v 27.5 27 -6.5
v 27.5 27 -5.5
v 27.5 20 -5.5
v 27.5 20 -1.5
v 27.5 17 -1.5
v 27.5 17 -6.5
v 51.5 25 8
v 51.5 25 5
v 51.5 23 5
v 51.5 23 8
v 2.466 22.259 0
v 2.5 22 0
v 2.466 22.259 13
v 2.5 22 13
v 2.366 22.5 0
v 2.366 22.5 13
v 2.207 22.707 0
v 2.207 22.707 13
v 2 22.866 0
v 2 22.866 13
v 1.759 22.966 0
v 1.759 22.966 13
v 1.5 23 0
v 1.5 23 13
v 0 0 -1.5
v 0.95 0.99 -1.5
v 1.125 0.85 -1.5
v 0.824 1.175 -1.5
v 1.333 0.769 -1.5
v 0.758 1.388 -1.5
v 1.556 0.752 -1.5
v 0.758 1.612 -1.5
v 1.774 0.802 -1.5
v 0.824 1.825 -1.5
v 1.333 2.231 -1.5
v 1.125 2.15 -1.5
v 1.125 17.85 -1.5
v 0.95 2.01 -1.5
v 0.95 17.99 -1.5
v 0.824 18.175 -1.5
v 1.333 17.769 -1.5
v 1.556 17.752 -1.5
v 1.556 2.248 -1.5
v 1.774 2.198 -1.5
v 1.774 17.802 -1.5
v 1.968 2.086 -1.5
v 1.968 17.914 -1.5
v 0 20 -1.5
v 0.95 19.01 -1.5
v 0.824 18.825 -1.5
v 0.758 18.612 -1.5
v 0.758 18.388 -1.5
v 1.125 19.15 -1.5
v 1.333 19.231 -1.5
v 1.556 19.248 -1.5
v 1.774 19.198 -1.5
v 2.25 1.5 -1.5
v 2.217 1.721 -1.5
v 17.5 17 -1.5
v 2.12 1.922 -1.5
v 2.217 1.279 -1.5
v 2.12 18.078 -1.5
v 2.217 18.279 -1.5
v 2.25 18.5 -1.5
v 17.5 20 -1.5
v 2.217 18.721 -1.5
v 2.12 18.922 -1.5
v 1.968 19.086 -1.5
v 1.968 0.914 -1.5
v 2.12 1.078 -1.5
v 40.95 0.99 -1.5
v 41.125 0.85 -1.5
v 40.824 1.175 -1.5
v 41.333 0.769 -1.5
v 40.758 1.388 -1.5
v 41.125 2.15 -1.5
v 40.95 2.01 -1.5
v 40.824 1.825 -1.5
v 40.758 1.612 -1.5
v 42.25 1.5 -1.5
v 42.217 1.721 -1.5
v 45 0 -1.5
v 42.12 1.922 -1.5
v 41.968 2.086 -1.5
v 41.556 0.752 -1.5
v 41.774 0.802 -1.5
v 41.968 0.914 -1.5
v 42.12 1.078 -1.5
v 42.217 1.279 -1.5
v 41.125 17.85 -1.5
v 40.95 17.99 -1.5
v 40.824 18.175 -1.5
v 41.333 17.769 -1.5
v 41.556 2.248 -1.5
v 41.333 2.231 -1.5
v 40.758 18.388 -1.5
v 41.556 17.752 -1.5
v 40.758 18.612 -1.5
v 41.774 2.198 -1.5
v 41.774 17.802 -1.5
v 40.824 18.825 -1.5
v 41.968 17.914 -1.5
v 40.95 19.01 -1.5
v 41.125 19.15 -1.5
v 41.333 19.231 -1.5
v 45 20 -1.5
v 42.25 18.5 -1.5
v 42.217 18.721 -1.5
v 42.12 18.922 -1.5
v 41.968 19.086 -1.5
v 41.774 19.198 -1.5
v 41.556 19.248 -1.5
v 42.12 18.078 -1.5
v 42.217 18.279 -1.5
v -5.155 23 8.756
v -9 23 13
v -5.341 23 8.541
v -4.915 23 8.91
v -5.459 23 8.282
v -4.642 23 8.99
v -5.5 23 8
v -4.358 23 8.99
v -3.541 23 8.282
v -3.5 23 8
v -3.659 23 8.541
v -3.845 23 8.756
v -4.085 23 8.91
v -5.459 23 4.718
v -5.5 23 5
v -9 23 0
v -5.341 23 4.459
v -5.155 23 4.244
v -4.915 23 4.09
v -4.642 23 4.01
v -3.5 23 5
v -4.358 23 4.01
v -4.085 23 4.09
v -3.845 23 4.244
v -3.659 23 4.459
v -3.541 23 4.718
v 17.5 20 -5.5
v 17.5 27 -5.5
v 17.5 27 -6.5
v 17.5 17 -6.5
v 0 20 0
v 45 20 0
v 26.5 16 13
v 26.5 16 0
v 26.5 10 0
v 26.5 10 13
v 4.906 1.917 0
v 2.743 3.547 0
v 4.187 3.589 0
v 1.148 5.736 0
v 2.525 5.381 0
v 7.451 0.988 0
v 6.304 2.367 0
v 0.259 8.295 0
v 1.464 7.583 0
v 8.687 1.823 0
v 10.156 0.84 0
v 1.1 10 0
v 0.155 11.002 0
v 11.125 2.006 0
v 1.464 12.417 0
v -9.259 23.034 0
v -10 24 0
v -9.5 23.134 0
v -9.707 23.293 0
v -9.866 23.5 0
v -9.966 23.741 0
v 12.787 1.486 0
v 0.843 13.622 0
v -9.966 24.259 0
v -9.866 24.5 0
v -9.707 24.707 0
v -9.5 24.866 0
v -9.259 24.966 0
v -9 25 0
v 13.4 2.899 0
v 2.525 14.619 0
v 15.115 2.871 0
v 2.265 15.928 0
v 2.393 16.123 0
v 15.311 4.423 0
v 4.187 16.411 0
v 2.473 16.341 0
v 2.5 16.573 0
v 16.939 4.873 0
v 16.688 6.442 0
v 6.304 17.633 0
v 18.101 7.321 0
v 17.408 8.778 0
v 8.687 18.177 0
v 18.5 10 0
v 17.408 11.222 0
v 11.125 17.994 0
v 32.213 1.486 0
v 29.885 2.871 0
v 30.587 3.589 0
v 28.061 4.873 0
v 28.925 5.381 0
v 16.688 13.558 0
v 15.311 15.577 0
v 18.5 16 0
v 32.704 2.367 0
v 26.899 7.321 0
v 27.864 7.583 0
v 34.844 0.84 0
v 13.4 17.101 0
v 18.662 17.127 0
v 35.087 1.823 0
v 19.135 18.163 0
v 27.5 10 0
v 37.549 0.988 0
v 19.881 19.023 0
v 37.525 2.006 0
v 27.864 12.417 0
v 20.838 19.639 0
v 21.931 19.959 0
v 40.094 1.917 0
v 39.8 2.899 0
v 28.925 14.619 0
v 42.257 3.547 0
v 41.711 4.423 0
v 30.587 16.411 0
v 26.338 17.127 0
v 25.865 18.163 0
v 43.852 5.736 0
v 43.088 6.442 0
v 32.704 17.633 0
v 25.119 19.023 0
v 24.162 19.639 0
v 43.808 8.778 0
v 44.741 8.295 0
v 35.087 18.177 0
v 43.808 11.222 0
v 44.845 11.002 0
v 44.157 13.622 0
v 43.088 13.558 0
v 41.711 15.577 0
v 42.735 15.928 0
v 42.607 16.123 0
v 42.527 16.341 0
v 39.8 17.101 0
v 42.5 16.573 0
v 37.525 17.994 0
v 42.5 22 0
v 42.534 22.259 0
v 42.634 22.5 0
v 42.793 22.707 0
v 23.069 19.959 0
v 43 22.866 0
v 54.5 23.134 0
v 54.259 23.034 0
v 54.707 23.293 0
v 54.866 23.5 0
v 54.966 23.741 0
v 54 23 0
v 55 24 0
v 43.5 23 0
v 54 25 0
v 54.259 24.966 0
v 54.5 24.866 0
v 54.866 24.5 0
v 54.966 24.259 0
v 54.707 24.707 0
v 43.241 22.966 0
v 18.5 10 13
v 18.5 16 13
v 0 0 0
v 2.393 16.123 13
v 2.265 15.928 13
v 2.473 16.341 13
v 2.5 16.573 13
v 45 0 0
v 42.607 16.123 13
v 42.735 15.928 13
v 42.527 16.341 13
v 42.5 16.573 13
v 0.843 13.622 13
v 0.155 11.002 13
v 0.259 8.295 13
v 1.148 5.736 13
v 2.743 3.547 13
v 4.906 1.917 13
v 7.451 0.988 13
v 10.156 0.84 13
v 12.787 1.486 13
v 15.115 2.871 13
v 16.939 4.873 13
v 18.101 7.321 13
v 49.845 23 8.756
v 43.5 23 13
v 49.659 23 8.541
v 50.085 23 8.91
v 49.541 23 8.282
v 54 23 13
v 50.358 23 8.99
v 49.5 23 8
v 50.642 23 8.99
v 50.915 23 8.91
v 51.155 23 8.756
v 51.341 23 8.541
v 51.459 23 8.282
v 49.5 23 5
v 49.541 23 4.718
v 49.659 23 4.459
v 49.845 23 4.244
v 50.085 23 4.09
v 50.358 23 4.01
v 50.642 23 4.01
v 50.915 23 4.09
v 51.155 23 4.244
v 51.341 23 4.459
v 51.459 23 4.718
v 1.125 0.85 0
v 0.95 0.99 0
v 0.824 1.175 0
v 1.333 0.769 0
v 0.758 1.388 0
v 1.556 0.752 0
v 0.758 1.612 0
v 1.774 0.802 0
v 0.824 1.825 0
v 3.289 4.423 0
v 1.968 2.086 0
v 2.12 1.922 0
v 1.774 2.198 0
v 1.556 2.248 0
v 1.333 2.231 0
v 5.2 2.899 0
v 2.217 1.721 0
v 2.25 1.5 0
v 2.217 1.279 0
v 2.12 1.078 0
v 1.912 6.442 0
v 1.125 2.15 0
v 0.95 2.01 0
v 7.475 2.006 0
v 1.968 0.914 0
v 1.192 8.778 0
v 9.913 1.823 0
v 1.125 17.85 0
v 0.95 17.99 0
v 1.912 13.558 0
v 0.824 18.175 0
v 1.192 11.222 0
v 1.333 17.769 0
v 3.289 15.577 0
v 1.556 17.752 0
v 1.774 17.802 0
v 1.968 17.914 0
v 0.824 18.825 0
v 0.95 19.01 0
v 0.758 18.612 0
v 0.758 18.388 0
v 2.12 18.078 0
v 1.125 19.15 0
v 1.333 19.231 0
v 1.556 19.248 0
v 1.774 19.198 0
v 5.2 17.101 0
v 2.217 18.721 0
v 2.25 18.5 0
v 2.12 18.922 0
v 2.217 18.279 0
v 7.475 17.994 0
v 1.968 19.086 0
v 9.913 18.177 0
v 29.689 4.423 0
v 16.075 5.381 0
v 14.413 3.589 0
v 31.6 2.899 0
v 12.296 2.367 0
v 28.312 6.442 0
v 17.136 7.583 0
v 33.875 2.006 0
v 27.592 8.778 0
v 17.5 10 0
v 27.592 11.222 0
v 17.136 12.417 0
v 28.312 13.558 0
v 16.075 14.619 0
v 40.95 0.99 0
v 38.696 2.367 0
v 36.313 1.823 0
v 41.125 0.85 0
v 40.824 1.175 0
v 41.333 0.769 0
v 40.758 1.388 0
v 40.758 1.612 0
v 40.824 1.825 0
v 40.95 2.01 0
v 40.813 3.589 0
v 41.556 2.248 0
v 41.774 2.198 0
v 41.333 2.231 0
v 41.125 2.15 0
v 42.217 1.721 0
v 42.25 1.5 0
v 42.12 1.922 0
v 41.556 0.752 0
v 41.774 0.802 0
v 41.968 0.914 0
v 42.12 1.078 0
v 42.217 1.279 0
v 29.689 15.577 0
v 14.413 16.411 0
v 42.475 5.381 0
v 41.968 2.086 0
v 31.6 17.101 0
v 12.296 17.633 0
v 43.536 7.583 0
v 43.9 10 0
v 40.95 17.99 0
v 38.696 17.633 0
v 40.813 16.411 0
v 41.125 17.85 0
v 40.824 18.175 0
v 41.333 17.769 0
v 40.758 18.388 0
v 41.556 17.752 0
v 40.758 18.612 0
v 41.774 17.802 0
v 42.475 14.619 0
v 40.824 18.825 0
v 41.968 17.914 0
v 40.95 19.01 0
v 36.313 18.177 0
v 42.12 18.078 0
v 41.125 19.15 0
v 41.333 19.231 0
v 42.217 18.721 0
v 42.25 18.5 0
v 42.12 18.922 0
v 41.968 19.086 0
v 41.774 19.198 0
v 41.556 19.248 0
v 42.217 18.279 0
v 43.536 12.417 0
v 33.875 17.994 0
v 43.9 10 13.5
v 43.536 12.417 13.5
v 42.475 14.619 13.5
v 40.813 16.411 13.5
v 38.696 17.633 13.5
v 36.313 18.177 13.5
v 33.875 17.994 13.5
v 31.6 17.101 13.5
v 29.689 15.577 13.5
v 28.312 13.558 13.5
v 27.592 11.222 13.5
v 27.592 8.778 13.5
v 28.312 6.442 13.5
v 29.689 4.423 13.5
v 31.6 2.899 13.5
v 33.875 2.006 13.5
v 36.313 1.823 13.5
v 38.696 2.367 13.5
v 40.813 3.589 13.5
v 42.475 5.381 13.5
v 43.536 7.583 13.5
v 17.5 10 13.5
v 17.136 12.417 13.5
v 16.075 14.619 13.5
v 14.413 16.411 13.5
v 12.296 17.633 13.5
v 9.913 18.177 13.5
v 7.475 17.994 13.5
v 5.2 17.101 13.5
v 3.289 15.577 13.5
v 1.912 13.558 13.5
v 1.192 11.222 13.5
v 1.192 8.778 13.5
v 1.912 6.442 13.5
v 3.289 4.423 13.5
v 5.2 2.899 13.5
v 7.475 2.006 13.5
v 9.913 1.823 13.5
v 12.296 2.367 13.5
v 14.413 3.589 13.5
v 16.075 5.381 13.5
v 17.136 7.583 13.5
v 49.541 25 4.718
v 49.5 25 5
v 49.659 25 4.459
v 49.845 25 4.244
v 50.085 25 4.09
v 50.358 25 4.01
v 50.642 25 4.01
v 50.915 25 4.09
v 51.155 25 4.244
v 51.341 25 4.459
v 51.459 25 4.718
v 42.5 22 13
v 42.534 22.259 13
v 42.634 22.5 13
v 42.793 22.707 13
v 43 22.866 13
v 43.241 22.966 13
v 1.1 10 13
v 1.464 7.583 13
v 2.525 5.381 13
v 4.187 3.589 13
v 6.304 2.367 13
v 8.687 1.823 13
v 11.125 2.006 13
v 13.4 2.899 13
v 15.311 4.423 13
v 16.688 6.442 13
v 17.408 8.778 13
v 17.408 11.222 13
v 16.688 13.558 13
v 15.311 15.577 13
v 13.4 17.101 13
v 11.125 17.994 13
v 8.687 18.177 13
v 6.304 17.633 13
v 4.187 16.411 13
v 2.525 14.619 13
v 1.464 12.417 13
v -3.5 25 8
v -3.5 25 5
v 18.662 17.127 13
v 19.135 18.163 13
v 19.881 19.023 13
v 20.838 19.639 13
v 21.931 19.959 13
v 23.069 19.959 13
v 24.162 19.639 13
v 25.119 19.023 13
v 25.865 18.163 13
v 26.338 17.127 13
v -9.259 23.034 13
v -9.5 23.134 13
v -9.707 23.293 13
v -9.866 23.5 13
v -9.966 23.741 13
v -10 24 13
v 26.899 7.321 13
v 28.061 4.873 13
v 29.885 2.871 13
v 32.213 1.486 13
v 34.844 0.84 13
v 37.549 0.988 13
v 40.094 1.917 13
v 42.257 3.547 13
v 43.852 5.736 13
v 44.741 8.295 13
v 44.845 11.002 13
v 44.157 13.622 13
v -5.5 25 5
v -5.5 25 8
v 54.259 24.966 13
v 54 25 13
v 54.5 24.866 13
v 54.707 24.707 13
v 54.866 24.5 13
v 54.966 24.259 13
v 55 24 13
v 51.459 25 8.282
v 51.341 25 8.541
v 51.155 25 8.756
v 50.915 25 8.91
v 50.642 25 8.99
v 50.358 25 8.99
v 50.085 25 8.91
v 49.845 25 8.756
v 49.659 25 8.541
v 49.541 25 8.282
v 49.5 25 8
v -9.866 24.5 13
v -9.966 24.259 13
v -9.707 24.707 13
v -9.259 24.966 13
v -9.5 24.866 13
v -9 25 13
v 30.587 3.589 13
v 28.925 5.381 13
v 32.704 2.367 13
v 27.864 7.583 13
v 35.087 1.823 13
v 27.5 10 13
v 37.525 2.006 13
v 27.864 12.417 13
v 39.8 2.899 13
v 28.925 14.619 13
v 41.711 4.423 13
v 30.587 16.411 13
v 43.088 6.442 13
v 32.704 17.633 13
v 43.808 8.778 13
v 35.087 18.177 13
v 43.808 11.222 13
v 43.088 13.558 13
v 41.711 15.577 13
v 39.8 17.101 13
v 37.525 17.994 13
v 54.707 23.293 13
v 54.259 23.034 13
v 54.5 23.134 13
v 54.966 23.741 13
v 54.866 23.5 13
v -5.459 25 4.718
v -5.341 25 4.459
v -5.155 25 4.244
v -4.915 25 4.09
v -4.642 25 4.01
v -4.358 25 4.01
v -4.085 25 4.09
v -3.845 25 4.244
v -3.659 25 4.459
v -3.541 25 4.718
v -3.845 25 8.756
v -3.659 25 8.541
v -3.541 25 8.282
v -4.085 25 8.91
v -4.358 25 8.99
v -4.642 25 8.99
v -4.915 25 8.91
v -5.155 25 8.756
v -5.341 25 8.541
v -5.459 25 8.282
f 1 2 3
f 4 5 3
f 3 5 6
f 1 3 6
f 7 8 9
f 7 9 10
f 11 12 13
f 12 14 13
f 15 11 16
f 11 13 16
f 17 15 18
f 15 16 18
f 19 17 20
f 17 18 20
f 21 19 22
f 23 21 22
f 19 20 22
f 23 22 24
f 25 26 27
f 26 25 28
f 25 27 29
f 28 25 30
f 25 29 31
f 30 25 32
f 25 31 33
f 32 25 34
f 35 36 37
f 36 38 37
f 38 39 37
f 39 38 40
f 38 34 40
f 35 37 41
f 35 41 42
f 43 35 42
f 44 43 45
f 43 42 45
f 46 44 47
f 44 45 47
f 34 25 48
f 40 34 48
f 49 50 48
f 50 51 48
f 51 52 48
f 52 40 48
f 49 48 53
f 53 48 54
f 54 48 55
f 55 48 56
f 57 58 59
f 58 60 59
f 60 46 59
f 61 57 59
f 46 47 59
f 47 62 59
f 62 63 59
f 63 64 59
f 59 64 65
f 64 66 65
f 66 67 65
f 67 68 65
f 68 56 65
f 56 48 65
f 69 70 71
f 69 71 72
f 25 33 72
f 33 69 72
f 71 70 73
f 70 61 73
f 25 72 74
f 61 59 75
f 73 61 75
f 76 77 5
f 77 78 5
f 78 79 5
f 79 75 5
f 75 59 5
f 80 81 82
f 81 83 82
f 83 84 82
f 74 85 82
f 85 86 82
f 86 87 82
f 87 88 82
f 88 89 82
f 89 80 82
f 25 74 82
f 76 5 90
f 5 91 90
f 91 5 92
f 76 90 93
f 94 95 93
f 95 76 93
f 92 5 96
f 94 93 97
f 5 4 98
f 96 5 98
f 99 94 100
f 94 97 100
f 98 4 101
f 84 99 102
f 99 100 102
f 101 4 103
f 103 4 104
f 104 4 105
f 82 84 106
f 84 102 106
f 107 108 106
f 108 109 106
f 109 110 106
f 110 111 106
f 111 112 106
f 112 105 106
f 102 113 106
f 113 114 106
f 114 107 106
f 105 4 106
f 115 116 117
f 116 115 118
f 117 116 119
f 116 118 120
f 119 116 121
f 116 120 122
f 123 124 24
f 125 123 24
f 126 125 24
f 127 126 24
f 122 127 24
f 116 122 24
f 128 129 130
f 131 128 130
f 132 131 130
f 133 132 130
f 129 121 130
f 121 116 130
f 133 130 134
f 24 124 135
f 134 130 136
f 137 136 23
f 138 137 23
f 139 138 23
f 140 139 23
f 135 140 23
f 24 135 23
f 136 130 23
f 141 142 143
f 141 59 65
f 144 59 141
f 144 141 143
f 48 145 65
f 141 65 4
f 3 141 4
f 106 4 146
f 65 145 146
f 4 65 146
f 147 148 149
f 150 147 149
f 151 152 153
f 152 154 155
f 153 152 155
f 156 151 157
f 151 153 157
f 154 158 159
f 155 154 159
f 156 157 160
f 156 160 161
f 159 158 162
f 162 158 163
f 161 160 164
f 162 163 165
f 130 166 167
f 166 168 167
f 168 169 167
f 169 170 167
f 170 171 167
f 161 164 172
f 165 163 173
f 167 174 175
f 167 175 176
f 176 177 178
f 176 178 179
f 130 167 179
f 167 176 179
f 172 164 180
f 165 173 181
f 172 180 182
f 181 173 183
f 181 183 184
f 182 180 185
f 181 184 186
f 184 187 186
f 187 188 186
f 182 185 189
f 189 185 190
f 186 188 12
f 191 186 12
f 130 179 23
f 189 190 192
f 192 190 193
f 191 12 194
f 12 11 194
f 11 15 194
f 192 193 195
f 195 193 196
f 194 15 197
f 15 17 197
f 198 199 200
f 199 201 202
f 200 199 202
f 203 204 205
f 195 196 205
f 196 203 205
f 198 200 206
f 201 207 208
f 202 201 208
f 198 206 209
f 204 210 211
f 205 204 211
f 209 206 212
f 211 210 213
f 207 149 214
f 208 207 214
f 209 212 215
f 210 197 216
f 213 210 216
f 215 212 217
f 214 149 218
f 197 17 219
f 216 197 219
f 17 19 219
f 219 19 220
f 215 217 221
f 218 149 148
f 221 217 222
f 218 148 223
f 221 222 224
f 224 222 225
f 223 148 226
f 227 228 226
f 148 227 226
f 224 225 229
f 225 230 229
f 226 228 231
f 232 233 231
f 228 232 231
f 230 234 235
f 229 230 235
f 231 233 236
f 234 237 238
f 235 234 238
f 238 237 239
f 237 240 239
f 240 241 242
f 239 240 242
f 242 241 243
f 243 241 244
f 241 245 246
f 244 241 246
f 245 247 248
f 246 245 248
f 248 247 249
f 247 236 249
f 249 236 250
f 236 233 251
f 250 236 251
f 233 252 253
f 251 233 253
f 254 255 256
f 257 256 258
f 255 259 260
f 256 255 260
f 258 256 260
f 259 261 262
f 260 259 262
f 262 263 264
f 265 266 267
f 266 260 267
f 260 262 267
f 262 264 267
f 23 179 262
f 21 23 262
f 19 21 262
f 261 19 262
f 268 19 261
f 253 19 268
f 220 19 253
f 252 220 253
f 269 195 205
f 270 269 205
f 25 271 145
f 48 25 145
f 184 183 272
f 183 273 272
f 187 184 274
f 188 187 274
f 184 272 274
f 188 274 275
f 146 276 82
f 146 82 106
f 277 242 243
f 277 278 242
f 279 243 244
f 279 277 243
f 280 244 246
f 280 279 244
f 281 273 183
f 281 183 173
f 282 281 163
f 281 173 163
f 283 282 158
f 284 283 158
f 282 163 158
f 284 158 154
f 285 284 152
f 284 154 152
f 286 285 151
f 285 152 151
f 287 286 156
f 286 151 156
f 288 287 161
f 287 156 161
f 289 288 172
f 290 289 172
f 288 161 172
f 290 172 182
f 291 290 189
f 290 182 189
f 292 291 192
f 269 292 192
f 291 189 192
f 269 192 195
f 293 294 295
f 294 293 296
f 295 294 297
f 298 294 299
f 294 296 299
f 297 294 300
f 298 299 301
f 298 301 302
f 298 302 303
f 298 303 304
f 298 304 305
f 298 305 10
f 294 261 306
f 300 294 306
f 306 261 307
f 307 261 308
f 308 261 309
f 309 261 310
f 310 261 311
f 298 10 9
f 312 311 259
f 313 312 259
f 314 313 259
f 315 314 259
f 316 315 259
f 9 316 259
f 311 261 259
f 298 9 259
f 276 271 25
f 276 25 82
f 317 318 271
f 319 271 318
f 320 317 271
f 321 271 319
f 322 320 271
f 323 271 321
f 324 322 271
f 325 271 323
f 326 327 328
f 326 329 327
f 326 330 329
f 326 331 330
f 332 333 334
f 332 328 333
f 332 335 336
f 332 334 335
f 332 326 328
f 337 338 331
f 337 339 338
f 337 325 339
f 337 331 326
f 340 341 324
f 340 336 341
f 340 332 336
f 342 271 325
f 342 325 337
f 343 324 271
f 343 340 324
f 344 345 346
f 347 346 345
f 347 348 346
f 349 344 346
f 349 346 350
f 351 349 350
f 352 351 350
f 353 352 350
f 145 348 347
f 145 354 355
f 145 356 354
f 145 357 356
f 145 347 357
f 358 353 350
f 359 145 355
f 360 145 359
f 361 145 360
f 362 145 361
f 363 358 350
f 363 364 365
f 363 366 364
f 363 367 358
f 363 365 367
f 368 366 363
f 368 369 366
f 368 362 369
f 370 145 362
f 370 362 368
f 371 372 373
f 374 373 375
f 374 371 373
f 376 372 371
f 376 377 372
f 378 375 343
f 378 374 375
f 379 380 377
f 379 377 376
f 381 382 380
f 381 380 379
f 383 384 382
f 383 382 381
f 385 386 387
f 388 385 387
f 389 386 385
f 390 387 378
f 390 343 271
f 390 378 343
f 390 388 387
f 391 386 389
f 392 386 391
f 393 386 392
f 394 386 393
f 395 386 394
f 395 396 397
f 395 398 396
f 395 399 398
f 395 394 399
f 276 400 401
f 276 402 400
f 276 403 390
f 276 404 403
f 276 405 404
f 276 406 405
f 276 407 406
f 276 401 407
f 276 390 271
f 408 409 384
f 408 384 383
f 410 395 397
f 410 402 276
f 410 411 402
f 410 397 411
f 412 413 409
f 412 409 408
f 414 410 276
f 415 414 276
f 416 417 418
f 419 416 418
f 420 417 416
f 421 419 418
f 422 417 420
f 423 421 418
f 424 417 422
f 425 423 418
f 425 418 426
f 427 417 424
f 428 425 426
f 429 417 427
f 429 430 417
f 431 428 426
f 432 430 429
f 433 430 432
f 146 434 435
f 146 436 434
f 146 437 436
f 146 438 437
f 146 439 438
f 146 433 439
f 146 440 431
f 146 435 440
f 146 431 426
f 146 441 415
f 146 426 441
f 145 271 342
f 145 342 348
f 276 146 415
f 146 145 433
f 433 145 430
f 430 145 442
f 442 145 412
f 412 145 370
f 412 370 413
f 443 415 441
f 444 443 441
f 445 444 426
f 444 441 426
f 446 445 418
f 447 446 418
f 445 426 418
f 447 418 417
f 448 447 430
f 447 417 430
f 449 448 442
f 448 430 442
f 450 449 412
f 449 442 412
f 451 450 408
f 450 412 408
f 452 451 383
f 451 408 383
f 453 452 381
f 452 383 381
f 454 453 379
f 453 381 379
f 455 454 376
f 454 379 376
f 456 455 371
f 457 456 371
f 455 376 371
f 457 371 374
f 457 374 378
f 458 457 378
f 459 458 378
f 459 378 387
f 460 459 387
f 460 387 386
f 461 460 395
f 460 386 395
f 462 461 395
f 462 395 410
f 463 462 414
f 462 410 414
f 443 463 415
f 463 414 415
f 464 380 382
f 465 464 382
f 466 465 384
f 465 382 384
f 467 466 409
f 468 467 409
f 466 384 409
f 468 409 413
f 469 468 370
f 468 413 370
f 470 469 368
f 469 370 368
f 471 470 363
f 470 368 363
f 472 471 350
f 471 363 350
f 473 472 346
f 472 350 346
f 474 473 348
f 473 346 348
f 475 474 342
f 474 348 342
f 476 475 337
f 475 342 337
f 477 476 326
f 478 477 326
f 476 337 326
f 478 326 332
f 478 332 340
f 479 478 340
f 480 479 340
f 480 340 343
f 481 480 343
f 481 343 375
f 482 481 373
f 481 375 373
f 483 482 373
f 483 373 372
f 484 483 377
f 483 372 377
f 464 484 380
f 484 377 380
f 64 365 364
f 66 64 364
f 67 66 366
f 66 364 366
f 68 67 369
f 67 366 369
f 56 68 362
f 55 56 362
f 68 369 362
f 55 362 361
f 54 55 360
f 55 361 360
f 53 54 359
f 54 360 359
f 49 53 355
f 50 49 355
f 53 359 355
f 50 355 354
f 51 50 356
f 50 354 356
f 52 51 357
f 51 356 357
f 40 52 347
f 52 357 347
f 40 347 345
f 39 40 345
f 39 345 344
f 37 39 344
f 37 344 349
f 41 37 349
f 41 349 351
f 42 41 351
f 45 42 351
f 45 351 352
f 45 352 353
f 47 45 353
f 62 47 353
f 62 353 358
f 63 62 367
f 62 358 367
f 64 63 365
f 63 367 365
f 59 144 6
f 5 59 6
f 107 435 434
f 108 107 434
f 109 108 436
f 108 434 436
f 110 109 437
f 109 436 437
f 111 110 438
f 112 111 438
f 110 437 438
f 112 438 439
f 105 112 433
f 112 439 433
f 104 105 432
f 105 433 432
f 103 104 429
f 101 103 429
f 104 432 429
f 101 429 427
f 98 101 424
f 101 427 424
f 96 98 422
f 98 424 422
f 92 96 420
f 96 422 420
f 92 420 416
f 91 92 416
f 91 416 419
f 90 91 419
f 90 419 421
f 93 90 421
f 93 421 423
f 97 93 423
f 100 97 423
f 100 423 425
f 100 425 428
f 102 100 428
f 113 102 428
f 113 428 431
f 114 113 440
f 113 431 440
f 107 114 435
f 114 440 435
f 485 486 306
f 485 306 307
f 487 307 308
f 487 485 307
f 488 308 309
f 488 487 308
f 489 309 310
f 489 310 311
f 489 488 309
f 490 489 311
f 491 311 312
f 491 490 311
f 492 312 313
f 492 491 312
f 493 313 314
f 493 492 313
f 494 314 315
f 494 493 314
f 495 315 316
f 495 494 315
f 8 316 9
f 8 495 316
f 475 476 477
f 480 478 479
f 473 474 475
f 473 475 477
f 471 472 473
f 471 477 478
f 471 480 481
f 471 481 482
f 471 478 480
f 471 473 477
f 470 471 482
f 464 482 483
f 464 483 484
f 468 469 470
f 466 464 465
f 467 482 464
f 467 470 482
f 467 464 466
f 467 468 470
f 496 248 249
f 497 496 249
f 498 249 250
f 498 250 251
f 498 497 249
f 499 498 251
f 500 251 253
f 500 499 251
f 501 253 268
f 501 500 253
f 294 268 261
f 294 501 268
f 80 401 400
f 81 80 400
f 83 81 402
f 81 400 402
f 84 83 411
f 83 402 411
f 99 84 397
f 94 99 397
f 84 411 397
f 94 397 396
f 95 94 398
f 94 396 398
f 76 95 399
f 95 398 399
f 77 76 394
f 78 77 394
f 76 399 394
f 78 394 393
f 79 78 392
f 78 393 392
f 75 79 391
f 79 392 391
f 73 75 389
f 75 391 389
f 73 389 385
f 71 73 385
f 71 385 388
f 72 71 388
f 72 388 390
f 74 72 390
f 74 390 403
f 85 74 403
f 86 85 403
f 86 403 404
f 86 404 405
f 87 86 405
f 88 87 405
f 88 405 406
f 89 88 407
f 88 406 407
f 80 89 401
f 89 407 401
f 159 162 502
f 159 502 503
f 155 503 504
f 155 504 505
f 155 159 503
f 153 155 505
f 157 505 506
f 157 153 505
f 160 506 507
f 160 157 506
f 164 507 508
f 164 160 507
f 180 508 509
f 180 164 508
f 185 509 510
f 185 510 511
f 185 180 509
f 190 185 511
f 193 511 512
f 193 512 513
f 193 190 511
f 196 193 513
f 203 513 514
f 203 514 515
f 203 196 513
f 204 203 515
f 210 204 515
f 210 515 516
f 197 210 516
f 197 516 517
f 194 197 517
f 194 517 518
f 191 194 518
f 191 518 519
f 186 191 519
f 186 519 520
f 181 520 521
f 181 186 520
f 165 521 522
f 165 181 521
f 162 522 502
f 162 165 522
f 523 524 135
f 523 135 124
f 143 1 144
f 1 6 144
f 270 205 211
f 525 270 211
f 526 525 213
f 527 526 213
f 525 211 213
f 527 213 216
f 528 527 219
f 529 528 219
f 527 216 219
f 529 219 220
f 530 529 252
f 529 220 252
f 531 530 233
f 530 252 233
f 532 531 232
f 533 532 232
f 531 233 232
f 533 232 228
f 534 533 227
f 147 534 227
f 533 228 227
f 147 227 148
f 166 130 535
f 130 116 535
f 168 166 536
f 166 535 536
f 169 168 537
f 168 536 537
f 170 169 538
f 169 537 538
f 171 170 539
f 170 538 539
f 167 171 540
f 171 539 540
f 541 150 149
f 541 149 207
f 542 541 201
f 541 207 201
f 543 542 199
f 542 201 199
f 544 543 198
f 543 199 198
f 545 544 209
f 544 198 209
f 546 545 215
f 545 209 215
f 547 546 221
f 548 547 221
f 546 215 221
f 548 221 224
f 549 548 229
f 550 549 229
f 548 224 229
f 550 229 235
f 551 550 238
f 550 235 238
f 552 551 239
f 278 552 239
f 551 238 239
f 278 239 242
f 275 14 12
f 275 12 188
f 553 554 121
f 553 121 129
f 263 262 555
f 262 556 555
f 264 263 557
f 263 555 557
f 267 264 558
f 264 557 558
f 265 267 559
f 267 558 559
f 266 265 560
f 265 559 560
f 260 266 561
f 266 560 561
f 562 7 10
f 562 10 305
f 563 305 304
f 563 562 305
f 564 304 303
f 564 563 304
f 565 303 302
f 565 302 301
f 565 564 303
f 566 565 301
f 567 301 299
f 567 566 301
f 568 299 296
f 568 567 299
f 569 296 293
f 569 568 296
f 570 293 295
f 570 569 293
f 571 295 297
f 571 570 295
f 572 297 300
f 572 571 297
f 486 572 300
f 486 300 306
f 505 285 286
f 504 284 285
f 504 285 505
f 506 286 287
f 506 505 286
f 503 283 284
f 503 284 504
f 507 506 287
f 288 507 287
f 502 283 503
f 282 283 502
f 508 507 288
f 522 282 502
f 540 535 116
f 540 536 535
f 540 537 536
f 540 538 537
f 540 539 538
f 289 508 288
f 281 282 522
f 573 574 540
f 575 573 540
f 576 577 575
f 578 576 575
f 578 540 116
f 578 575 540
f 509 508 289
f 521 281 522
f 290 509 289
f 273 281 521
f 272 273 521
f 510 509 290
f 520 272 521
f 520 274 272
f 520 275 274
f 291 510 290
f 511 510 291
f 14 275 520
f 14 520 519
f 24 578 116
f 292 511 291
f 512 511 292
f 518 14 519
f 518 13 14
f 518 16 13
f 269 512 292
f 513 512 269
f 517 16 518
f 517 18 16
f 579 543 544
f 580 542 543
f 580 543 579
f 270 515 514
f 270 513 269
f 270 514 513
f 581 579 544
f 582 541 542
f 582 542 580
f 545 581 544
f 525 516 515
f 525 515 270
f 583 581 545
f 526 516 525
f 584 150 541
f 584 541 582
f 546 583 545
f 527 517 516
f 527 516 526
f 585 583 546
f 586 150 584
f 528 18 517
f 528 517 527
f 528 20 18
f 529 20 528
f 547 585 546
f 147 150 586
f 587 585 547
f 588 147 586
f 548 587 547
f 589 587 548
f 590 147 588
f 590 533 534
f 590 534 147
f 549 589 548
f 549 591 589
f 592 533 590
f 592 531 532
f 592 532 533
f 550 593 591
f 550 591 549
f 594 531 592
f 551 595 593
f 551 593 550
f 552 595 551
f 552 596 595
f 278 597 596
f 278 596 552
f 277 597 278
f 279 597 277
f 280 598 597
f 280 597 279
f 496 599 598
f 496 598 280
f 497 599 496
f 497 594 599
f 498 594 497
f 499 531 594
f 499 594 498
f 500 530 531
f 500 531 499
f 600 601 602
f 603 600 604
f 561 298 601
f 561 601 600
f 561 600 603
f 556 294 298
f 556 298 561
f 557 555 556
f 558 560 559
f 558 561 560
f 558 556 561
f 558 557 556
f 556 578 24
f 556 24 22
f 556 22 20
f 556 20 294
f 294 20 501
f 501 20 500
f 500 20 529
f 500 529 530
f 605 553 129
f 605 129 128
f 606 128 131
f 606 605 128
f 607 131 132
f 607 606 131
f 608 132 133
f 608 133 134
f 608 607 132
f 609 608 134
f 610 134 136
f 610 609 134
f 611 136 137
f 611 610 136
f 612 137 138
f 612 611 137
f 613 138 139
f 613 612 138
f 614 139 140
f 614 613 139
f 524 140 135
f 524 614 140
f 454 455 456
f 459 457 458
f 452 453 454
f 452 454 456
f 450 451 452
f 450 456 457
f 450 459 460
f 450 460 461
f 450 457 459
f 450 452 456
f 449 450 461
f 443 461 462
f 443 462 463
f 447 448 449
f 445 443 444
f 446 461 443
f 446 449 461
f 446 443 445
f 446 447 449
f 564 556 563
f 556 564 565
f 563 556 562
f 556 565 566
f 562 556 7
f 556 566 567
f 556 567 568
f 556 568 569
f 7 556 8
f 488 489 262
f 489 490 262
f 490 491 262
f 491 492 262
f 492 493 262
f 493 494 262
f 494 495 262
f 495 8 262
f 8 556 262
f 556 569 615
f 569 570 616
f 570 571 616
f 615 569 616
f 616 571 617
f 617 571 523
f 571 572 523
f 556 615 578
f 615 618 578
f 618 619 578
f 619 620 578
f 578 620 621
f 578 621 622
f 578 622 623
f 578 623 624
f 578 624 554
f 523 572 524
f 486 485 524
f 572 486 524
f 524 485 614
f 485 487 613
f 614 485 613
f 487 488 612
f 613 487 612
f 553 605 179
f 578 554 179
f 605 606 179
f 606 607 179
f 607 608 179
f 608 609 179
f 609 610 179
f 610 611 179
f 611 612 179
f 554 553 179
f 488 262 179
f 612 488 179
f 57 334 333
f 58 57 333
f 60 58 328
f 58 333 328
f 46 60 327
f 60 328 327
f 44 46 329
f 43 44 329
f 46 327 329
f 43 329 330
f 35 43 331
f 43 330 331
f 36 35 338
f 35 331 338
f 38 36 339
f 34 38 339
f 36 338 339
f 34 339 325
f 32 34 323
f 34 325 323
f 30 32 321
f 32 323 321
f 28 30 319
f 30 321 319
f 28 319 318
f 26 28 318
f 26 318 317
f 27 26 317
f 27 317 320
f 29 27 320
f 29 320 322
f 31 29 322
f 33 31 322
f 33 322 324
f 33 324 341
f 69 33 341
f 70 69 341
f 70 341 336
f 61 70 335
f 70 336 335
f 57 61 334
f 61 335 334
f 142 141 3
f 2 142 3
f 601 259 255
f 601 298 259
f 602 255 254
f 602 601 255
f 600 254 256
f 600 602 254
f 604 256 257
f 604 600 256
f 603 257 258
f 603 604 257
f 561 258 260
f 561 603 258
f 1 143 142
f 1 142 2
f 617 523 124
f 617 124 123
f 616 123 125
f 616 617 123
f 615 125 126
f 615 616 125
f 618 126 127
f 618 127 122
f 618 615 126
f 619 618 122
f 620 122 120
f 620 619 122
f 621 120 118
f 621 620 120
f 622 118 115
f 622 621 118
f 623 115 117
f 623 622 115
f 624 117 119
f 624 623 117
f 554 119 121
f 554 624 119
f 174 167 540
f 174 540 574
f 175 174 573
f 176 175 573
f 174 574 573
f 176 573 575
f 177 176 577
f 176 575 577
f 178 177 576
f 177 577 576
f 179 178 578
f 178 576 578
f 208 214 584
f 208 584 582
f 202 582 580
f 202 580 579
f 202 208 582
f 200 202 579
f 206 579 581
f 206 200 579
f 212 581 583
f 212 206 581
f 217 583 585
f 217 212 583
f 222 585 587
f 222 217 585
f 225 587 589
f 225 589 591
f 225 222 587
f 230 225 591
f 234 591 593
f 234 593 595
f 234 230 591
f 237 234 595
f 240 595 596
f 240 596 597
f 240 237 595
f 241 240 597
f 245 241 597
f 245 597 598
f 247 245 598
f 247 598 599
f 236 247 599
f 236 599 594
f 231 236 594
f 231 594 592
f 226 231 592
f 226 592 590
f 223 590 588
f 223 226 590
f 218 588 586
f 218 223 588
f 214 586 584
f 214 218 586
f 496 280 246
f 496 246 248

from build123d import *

# Parameters (mm, degrees)
SKETCH1_W           = 45
SKETCH1_H           = 20
SKETCH1_R           = 0.75
BOSS_EXTRUDE1_DEPTH = 1.5
SKETCH1_3_R         = 8.2
BOSS_EXTRUDE2_DEPTH = 13.5
SKETCH2_W           = 5
SKETCH2_H           = 4
SKETCH2_H_2         = 1
BOSS_EXTRUDE3_DEPTH = 3
SKETCH2_3_W         = 5
SKETCH2_3_H         = 1
BOSS_EXTRUDE4_DEPTH = 7
SKETCH4_R           = 8.2
BOSS_EXTRUDE5_DEPTH = 13
CUT_EXTRUDE1_DEPTH  = 2
FILLET1_R           = 1


with BuildPart() as part:
    # Sketch1 → Boss-Extrude1 (new body)
    with BuildSketch(Plane.XY):
        with Locations((22.5, 10)):
            Rectangle(SKETCH1_W, SKETCH1_H)
        with Locations((1.5, 1.5)):
            Circle(SKETCH1_R, mode=Mode.SUBTRACT)
        with Locations((1.5, 18.5)):
            Circle(SKETCH1_R, mode=Mode.SUBTRACT)
        with Locations((41.5, 18.5)):
            Circle(SKETCH1_R, mode=Mode.SUBTRACT)
        with Locations((41.5, 1.5)):
            Circle(SKETCH1_R, mode=Mode.SUBTRACT)
    extrude(amount=-BOSS_EXTRUDE1_DEPTH)

    # Sketch1<3> → Boss-Extrude2 (add)
    with BuildSketch(Plane.XY):
        with Locations((9.3, 10)):
            Circle(SKETCH1_3_R)
        with Locations((35.7, 10)):
            Circle(SKETCH1_3_R)
    extrude(amount=BOSS_EXTRUDE2_DEPTH)

    # Sketch2 → Boss-Extrude3 (add)
    with BuildSketch(Plane(origin=(0, 20, 0), x_dir=(1, 0, 0), z_dir=(0, 1, 0))):
        with Locations((25, 3.5)):
            Rectangle(SKETCH2_W, SKETCH2_H)
        with Locations((20, 3.5)):
            Rectangle(SKETCH2_W, SKETCH2_H)
        with Locations((20, 6)):
            Rectangle(SKETCH2_W, SKETCH2_H_2)
        with Locations((25, 6)):
            Rectangle(SKETCH2_W, SKETCH2_H_2)
    extrude(amount=-BOSS_EXTRUDE3_DEPTH)

    # Sketch2<3> → Boss-Extrude4 (add)
    with BuildSketch(Plane(origin=(0, 20, 0), x_dir=(1, 0, 0), z_dir=(0, 1, 0))):
        with Locations((25, 6)):
            Rectangle(SKETCH2_3_W, SKETCH2_3_H)
        with Locations((20, 6)):
            Rectangle(SKETCH2_3_W, SKETCH2_3_H)
    extrude(amount=BOSS_EXTRUDE4_DEPTH)


with BuildPart() as body_2:
    # Sketch4 → Boss-Extrude5 (new body)
    with BuildSketch(Plane.XY):
        with BuildLine():
            Line((18.5, 10), (18.5, 16))
            ThreePointArc((18.5, 16), (22.5, 20), (26.5, 16))
            Line((26.5, 16), (26.5, 10))
            ThreePointArc((26.5, 10), (39.022649545, 1.420955764), (42.5, 16.196773354))
            Line((42.5, 16.196773354), (42.5, 23))
            Line((42.5, 23), (55, 23))
            Line((55, 23), (55, 25))
            Line((55, 25), (-10, 25))
            Line((-10, 25), (-10, 23))
            Line((-10, 23), (2.5, 23))
            Line((2.5, 23), (2.5, 16.196773354))
            ThreePointArc((2.5, 16.196773354), (5.977350455, 1.420955764), (18.5, 10))
        make_face()
        with Locations(Location((35.7, 10, 0), (0, 0, 180))):
            Circle(SKETCH4_R, mode=Mode.SUBTRACT)
        with Locations(Location((9.3, 10, 0), (0, 0, 180))):
            Circle(SKETCH4_R, mode=Mode.SUBTRACT)
    extrude(amount=BOSS_EXTRUDE5_DEPTH)

    # Sketch5 → Cut-Extrude1 (cut)
    with BuildSketch(Plane(origin=(0, 25, 0), x_dir=(1, 0, 0), z_dir=(0, 1, 0))):
        with BuildLine():
            Line((-3.5, -5), (-3.5, -8))
            ThreePointArc((-3.5, -8), (-4.5, -9), (-5.5, -8))
            Line((-5.5, -8), (-5.5, -5))
            ThreePointArc((-5.5, -5), (-4.5, -4), (-3.5, -5))
        make_face()
        with BuildLine():
            Line((51.5, -5), (51.5, -8))
            ThreePointArc((51.5, -8), (50.5, -9), (49.5, -8))
            Line((49.5, -8), (49.5, -5))
            ThreePointArc((49.5, -5), (50.5, -4), (51.5, -5))
        make_face()
    extrude(amount=-CUT_EXTRUDE1_DEPTH, mode=Mode.SUBTRACT)

    # Fillet1
    fillet1_edges = [body_2.edges().sort_by_distance(p)[0] for p in [
        (55, 25, 6.5),
        (-10, 25, 6.5),
        (42.5, 16.196773354, 6.5),
        (2.5, 16.196773354, 6.5),
        (42.5, 23, 6.5),
        (55, 23, 6.5),
        (2.5, 23, 6.5),
        (-10, 23, 6.5),
    ]]
    fillet(fillet1_edges, radius=FILLET1_R - 0.0001)  # a hair under: the kernel refuses the full size


solid = Compound([part.part, body_2.part])
